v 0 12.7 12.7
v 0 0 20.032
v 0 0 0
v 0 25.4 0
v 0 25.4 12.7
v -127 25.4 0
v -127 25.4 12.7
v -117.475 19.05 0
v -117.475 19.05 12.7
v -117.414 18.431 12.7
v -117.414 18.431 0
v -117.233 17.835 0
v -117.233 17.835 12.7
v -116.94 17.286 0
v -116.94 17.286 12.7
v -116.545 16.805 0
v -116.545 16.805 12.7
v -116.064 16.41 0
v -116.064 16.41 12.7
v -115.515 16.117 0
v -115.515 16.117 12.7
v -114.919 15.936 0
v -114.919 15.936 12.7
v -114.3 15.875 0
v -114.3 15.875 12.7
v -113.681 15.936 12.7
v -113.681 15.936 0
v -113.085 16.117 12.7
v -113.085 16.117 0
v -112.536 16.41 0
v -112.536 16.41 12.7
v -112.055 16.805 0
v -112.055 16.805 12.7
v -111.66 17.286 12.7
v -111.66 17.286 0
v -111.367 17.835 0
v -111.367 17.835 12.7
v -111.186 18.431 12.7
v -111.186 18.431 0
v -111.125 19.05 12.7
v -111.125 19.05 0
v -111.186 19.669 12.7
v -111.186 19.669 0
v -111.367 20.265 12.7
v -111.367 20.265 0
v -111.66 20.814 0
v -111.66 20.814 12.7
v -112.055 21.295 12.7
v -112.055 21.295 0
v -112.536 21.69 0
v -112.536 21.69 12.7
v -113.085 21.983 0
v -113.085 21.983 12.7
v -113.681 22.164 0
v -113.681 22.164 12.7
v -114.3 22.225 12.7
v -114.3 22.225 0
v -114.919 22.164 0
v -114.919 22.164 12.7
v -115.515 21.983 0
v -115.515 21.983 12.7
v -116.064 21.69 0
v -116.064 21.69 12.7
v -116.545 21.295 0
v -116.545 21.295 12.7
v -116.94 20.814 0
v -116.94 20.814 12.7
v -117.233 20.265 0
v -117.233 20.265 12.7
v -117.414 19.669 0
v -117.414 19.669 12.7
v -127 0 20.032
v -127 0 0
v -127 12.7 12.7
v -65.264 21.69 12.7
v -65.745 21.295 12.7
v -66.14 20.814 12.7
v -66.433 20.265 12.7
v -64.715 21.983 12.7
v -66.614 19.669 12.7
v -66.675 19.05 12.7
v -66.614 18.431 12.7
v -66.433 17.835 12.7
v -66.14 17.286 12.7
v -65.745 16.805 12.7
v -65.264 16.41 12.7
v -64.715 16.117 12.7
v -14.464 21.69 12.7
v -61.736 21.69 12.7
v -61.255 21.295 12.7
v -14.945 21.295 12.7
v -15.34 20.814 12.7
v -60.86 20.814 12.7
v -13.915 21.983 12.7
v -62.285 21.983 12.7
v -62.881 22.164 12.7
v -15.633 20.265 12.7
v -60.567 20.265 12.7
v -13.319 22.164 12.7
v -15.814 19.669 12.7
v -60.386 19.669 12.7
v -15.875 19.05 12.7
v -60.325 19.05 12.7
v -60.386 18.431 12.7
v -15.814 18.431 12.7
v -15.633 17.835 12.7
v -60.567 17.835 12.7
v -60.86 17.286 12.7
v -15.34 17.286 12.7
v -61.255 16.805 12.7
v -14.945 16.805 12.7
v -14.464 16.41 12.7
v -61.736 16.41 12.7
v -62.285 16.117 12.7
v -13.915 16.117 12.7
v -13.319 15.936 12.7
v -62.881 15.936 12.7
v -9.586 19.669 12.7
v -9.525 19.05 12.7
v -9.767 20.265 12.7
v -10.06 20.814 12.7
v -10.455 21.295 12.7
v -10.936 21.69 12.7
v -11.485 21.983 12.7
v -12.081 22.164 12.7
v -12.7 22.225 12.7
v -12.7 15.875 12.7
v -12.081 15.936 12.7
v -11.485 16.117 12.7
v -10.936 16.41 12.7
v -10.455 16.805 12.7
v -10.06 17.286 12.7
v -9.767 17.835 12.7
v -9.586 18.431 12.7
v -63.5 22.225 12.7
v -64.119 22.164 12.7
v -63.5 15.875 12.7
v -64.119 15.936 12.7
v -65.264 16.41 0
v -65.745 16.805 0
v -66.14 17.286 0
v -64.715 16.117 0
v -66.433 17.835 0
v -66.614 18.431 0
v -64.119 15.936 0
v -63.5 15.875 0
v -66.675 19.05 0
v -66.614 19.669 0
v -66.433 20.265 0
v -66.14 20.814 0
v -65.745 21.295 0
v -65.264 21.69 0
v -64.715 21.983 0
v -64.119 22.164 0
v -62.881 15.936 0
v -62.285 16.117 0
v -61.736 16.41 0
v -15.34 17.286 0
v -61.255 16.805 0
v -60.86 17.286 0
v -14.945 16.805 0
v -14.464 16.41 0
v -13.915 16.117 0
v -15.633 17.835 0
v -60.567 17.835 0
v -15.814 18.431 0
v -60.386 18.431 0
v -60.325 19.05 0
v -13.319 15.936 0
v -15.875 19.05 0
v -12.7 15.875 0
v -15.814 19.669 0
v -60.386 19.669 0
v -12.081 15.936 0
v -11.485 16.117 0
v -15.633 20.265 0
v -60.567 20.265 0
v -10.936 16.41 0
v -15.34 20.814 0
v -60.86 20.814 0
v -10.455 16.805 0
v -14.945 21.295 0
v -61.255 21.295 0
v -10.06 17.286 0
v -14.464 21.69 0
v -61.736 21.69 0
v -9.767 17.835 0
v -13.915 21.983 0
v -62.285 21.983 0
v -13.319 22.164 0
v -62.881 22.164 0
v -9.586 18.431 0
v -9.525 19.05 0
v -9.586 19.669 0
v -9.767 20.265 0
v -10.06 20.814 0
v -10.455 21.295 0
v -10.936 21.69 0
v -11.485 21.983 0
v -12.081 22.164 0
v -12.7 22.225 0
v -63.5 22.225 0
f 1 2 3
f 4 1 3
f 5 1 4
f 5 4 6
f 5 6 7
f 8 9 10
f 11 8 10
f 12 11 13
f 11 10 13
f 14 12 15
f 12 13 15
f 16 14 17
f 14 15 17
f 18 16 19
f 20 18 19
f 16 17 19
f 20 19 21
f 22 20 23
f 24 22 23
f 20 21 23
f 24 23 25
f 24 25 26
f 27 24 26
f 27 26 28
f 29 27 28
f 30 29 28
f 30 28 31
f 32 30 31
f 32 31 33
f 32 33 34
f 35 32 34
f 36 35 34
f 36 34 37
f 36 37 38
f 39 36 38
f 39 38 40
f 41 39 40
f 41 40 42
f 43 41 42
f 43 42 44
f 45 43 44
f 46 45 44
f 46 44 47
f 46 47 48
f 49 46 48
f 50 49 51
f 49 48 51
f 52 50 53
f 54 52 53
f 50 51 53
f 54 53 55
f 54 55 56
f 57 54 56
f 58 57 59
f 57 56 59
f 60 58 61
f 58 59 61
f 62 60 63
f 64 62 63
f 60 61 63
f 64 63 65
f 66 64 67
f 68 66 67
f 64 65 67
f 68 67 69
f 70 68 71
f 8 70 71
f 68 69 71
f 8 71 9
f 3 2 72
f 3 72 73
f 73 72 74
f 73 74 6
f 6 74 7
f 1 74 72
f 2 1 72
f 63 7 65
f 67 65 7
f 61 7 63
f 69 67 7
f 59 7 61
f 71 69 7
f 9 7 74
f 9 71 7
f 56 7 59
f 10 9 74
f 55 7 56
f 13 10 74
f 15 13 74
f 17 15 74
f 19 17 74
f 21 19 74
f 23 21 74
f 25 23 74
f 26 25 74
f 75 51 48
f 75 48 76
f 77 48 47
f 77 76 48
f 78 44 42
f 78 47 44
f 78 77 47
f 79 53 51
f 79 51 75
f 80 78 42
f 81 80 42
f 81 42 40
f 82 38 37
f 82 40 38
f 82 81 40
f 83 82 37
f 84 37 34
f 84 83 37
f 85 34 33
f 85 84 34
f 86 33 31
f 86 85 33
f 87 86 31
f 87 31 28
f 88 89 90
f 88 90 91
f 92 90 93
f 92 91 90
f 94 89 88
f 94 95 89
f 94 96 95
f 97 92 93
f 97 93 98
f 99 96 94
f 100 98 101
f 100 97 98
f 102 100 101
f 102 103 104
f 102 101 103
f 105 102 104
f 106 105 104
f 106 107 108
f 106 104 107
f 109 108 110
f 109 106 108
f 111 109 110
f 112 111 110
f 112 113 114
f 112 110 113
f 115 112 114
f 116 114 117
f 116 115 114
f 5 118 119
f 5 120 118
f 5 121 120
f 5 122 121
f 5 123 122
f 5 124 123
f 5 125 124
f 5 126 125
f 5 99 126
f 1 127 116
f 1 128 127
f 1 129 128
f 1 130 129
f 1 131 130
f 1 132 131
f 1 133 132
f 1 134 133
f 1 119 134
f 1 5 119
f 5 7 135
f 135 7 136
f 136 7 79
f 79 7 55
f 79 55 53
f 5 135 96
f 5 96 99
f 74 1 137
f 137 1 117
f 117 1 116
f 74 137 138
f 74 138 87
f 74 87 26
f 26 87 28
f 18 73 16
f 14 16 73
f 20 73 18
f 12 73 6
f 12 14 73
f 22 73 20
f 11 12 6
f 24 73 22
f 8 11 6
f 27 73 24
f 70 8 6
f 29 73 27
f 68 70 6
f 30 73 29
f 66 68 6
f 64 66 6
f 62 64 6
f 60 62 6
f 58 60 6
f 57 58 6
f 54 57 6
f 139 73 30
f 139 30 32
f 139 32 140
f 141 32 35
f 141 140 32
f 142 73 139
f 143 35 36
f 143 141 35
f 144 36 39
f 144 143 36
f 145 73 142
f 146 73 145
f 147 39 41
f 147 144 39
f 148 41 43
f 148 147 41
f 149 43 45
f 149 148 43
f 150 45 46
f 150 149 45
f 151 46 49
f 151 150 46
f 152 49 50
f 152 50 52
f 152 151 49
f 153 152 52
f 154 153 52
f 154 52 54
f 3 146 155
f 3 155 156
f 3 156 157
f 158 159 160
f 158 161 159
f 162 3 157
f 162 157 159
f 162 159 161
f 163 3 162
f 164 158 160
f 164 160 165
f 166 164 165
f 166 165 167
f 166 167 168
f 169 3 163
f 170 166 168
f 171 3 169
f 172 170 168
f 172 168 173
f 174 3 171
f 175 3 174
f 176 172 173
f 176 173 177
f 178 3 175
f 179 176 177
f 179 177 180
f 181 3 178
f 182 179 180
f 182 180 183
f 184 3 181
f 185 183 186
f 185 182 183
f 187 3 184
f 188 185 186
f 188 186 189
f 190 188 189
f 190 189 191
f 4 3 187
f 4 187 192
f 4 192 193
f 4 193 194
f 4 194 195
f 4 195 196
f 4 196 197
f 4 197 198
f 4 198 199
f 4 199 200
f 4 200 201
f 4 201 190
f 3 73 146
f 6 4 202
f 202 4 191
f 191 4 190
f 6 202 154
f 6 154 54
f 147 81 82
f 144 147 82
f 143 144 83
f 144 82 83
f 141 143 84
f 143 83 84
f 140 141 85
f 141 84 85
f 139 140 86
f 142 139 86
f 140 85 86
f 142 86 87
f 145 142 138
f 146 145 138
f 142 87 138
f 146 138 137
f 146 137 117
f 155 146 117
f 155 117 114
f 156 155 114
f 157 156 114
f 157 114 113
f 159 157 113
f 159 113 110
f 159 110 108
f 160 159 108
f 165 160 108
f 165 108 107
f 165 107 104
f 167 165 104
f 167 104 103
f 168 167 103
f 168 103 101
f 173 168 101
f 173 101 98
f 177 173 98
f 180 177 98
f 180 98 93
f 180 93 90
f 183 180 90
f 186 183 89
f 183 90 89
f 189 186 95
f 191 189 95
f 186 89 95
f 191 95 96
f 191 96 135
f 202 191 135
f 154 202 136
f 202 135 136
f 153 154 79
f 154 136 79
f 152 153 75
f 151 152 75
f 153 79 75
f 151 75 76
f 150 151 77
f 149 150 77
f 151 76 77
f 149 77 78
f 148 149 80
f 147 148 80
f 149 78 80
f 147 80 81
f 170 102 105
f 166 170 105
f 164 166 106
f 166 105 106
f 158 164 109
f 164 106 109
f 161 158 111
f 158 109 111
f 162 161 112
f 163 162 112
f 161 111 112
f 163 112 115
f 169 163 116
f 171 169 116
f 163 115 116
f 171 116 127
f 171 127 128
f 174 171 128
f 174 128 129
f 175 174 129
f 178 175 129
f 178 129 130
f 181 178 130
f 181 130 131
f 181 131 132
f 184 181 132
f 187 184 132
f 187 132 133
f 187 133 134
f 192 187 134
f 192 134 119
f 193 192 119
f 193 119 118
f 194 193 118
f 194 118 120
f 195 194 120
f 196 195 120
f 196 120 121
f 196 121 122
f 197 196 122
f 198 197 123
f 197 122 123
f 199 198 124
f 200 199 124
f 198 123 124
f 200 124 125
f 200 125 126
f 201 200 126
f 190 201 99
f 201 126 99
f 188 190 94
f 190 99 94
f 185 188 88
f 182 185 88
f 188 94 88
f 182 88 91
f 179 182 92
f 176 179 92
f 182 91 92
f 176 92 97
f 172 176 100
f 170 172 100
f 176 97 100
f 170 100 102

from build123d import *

# Parameters (mm, degrees)
F1_DEPTH = 127
F3_DEPTH = 12.701


with BuildPart() as f1:
    # F0 (on Right) → F1 (new body)
    with BuildSketch(Plane.YZ):
        Polygon((0, 20.032348), (0, 0), (25.4, 0), (25.4, 12.7), (12.7, 12.7), align=None)
    extrude(amount=-F1_DEPTH)

    # F2 (on face) → F3 (cut, through all)
    with BuildSketch(Plane.XY.offset(12.7)):
        with BuildLine():
            ThreePointArc((-111.125, 19.05), (-114.3, 22.225), (-117.475, 19.05))
            Line((-117.475, 19.05), (-111.125, 19.05))
        make_face()
        with BuildLine():
            ThreePointArc((-9.525, 19.05), (-12.7, 22.225), (-15.875, 19.05))
            Line((-15.875, 19.05), (-9.525, 19.05))
        make_face()
        with BuildLine():
            Line((-9.525, 19.05), (-15.875, 19.05))
            ThreePointArc((-15.875, 19.05), (-12.7, 15.875), (-9.525, 19.05))
        make_face()
        with BuildLine():
            ThreePointArc((-60.325, 19.05), (-63.5, 22.225), (-66.675, 19.05))
            Line((-66.675, 19.05), (-60.325, 19.05))
        make_face()
        with BuildLine():
            Line((-60.325, 19.05), (-66.675, 19.05))
            ThreePointArc((-66.675, 19.05), (-63.5, 15.875), (-60.325, 19.05))
        make_face()
        with BuildLine():
            Line((-111.125, 19.05), (-117.475, 19.05))
            ThreePointArc((-117.475, 19.05), (-114.3, 15.875), (-111.125, 19.05))
        make_face()
    extrude(amount=-F3_DEPTH, mode=Mode.SUBTRACT)


solid = f1.part
